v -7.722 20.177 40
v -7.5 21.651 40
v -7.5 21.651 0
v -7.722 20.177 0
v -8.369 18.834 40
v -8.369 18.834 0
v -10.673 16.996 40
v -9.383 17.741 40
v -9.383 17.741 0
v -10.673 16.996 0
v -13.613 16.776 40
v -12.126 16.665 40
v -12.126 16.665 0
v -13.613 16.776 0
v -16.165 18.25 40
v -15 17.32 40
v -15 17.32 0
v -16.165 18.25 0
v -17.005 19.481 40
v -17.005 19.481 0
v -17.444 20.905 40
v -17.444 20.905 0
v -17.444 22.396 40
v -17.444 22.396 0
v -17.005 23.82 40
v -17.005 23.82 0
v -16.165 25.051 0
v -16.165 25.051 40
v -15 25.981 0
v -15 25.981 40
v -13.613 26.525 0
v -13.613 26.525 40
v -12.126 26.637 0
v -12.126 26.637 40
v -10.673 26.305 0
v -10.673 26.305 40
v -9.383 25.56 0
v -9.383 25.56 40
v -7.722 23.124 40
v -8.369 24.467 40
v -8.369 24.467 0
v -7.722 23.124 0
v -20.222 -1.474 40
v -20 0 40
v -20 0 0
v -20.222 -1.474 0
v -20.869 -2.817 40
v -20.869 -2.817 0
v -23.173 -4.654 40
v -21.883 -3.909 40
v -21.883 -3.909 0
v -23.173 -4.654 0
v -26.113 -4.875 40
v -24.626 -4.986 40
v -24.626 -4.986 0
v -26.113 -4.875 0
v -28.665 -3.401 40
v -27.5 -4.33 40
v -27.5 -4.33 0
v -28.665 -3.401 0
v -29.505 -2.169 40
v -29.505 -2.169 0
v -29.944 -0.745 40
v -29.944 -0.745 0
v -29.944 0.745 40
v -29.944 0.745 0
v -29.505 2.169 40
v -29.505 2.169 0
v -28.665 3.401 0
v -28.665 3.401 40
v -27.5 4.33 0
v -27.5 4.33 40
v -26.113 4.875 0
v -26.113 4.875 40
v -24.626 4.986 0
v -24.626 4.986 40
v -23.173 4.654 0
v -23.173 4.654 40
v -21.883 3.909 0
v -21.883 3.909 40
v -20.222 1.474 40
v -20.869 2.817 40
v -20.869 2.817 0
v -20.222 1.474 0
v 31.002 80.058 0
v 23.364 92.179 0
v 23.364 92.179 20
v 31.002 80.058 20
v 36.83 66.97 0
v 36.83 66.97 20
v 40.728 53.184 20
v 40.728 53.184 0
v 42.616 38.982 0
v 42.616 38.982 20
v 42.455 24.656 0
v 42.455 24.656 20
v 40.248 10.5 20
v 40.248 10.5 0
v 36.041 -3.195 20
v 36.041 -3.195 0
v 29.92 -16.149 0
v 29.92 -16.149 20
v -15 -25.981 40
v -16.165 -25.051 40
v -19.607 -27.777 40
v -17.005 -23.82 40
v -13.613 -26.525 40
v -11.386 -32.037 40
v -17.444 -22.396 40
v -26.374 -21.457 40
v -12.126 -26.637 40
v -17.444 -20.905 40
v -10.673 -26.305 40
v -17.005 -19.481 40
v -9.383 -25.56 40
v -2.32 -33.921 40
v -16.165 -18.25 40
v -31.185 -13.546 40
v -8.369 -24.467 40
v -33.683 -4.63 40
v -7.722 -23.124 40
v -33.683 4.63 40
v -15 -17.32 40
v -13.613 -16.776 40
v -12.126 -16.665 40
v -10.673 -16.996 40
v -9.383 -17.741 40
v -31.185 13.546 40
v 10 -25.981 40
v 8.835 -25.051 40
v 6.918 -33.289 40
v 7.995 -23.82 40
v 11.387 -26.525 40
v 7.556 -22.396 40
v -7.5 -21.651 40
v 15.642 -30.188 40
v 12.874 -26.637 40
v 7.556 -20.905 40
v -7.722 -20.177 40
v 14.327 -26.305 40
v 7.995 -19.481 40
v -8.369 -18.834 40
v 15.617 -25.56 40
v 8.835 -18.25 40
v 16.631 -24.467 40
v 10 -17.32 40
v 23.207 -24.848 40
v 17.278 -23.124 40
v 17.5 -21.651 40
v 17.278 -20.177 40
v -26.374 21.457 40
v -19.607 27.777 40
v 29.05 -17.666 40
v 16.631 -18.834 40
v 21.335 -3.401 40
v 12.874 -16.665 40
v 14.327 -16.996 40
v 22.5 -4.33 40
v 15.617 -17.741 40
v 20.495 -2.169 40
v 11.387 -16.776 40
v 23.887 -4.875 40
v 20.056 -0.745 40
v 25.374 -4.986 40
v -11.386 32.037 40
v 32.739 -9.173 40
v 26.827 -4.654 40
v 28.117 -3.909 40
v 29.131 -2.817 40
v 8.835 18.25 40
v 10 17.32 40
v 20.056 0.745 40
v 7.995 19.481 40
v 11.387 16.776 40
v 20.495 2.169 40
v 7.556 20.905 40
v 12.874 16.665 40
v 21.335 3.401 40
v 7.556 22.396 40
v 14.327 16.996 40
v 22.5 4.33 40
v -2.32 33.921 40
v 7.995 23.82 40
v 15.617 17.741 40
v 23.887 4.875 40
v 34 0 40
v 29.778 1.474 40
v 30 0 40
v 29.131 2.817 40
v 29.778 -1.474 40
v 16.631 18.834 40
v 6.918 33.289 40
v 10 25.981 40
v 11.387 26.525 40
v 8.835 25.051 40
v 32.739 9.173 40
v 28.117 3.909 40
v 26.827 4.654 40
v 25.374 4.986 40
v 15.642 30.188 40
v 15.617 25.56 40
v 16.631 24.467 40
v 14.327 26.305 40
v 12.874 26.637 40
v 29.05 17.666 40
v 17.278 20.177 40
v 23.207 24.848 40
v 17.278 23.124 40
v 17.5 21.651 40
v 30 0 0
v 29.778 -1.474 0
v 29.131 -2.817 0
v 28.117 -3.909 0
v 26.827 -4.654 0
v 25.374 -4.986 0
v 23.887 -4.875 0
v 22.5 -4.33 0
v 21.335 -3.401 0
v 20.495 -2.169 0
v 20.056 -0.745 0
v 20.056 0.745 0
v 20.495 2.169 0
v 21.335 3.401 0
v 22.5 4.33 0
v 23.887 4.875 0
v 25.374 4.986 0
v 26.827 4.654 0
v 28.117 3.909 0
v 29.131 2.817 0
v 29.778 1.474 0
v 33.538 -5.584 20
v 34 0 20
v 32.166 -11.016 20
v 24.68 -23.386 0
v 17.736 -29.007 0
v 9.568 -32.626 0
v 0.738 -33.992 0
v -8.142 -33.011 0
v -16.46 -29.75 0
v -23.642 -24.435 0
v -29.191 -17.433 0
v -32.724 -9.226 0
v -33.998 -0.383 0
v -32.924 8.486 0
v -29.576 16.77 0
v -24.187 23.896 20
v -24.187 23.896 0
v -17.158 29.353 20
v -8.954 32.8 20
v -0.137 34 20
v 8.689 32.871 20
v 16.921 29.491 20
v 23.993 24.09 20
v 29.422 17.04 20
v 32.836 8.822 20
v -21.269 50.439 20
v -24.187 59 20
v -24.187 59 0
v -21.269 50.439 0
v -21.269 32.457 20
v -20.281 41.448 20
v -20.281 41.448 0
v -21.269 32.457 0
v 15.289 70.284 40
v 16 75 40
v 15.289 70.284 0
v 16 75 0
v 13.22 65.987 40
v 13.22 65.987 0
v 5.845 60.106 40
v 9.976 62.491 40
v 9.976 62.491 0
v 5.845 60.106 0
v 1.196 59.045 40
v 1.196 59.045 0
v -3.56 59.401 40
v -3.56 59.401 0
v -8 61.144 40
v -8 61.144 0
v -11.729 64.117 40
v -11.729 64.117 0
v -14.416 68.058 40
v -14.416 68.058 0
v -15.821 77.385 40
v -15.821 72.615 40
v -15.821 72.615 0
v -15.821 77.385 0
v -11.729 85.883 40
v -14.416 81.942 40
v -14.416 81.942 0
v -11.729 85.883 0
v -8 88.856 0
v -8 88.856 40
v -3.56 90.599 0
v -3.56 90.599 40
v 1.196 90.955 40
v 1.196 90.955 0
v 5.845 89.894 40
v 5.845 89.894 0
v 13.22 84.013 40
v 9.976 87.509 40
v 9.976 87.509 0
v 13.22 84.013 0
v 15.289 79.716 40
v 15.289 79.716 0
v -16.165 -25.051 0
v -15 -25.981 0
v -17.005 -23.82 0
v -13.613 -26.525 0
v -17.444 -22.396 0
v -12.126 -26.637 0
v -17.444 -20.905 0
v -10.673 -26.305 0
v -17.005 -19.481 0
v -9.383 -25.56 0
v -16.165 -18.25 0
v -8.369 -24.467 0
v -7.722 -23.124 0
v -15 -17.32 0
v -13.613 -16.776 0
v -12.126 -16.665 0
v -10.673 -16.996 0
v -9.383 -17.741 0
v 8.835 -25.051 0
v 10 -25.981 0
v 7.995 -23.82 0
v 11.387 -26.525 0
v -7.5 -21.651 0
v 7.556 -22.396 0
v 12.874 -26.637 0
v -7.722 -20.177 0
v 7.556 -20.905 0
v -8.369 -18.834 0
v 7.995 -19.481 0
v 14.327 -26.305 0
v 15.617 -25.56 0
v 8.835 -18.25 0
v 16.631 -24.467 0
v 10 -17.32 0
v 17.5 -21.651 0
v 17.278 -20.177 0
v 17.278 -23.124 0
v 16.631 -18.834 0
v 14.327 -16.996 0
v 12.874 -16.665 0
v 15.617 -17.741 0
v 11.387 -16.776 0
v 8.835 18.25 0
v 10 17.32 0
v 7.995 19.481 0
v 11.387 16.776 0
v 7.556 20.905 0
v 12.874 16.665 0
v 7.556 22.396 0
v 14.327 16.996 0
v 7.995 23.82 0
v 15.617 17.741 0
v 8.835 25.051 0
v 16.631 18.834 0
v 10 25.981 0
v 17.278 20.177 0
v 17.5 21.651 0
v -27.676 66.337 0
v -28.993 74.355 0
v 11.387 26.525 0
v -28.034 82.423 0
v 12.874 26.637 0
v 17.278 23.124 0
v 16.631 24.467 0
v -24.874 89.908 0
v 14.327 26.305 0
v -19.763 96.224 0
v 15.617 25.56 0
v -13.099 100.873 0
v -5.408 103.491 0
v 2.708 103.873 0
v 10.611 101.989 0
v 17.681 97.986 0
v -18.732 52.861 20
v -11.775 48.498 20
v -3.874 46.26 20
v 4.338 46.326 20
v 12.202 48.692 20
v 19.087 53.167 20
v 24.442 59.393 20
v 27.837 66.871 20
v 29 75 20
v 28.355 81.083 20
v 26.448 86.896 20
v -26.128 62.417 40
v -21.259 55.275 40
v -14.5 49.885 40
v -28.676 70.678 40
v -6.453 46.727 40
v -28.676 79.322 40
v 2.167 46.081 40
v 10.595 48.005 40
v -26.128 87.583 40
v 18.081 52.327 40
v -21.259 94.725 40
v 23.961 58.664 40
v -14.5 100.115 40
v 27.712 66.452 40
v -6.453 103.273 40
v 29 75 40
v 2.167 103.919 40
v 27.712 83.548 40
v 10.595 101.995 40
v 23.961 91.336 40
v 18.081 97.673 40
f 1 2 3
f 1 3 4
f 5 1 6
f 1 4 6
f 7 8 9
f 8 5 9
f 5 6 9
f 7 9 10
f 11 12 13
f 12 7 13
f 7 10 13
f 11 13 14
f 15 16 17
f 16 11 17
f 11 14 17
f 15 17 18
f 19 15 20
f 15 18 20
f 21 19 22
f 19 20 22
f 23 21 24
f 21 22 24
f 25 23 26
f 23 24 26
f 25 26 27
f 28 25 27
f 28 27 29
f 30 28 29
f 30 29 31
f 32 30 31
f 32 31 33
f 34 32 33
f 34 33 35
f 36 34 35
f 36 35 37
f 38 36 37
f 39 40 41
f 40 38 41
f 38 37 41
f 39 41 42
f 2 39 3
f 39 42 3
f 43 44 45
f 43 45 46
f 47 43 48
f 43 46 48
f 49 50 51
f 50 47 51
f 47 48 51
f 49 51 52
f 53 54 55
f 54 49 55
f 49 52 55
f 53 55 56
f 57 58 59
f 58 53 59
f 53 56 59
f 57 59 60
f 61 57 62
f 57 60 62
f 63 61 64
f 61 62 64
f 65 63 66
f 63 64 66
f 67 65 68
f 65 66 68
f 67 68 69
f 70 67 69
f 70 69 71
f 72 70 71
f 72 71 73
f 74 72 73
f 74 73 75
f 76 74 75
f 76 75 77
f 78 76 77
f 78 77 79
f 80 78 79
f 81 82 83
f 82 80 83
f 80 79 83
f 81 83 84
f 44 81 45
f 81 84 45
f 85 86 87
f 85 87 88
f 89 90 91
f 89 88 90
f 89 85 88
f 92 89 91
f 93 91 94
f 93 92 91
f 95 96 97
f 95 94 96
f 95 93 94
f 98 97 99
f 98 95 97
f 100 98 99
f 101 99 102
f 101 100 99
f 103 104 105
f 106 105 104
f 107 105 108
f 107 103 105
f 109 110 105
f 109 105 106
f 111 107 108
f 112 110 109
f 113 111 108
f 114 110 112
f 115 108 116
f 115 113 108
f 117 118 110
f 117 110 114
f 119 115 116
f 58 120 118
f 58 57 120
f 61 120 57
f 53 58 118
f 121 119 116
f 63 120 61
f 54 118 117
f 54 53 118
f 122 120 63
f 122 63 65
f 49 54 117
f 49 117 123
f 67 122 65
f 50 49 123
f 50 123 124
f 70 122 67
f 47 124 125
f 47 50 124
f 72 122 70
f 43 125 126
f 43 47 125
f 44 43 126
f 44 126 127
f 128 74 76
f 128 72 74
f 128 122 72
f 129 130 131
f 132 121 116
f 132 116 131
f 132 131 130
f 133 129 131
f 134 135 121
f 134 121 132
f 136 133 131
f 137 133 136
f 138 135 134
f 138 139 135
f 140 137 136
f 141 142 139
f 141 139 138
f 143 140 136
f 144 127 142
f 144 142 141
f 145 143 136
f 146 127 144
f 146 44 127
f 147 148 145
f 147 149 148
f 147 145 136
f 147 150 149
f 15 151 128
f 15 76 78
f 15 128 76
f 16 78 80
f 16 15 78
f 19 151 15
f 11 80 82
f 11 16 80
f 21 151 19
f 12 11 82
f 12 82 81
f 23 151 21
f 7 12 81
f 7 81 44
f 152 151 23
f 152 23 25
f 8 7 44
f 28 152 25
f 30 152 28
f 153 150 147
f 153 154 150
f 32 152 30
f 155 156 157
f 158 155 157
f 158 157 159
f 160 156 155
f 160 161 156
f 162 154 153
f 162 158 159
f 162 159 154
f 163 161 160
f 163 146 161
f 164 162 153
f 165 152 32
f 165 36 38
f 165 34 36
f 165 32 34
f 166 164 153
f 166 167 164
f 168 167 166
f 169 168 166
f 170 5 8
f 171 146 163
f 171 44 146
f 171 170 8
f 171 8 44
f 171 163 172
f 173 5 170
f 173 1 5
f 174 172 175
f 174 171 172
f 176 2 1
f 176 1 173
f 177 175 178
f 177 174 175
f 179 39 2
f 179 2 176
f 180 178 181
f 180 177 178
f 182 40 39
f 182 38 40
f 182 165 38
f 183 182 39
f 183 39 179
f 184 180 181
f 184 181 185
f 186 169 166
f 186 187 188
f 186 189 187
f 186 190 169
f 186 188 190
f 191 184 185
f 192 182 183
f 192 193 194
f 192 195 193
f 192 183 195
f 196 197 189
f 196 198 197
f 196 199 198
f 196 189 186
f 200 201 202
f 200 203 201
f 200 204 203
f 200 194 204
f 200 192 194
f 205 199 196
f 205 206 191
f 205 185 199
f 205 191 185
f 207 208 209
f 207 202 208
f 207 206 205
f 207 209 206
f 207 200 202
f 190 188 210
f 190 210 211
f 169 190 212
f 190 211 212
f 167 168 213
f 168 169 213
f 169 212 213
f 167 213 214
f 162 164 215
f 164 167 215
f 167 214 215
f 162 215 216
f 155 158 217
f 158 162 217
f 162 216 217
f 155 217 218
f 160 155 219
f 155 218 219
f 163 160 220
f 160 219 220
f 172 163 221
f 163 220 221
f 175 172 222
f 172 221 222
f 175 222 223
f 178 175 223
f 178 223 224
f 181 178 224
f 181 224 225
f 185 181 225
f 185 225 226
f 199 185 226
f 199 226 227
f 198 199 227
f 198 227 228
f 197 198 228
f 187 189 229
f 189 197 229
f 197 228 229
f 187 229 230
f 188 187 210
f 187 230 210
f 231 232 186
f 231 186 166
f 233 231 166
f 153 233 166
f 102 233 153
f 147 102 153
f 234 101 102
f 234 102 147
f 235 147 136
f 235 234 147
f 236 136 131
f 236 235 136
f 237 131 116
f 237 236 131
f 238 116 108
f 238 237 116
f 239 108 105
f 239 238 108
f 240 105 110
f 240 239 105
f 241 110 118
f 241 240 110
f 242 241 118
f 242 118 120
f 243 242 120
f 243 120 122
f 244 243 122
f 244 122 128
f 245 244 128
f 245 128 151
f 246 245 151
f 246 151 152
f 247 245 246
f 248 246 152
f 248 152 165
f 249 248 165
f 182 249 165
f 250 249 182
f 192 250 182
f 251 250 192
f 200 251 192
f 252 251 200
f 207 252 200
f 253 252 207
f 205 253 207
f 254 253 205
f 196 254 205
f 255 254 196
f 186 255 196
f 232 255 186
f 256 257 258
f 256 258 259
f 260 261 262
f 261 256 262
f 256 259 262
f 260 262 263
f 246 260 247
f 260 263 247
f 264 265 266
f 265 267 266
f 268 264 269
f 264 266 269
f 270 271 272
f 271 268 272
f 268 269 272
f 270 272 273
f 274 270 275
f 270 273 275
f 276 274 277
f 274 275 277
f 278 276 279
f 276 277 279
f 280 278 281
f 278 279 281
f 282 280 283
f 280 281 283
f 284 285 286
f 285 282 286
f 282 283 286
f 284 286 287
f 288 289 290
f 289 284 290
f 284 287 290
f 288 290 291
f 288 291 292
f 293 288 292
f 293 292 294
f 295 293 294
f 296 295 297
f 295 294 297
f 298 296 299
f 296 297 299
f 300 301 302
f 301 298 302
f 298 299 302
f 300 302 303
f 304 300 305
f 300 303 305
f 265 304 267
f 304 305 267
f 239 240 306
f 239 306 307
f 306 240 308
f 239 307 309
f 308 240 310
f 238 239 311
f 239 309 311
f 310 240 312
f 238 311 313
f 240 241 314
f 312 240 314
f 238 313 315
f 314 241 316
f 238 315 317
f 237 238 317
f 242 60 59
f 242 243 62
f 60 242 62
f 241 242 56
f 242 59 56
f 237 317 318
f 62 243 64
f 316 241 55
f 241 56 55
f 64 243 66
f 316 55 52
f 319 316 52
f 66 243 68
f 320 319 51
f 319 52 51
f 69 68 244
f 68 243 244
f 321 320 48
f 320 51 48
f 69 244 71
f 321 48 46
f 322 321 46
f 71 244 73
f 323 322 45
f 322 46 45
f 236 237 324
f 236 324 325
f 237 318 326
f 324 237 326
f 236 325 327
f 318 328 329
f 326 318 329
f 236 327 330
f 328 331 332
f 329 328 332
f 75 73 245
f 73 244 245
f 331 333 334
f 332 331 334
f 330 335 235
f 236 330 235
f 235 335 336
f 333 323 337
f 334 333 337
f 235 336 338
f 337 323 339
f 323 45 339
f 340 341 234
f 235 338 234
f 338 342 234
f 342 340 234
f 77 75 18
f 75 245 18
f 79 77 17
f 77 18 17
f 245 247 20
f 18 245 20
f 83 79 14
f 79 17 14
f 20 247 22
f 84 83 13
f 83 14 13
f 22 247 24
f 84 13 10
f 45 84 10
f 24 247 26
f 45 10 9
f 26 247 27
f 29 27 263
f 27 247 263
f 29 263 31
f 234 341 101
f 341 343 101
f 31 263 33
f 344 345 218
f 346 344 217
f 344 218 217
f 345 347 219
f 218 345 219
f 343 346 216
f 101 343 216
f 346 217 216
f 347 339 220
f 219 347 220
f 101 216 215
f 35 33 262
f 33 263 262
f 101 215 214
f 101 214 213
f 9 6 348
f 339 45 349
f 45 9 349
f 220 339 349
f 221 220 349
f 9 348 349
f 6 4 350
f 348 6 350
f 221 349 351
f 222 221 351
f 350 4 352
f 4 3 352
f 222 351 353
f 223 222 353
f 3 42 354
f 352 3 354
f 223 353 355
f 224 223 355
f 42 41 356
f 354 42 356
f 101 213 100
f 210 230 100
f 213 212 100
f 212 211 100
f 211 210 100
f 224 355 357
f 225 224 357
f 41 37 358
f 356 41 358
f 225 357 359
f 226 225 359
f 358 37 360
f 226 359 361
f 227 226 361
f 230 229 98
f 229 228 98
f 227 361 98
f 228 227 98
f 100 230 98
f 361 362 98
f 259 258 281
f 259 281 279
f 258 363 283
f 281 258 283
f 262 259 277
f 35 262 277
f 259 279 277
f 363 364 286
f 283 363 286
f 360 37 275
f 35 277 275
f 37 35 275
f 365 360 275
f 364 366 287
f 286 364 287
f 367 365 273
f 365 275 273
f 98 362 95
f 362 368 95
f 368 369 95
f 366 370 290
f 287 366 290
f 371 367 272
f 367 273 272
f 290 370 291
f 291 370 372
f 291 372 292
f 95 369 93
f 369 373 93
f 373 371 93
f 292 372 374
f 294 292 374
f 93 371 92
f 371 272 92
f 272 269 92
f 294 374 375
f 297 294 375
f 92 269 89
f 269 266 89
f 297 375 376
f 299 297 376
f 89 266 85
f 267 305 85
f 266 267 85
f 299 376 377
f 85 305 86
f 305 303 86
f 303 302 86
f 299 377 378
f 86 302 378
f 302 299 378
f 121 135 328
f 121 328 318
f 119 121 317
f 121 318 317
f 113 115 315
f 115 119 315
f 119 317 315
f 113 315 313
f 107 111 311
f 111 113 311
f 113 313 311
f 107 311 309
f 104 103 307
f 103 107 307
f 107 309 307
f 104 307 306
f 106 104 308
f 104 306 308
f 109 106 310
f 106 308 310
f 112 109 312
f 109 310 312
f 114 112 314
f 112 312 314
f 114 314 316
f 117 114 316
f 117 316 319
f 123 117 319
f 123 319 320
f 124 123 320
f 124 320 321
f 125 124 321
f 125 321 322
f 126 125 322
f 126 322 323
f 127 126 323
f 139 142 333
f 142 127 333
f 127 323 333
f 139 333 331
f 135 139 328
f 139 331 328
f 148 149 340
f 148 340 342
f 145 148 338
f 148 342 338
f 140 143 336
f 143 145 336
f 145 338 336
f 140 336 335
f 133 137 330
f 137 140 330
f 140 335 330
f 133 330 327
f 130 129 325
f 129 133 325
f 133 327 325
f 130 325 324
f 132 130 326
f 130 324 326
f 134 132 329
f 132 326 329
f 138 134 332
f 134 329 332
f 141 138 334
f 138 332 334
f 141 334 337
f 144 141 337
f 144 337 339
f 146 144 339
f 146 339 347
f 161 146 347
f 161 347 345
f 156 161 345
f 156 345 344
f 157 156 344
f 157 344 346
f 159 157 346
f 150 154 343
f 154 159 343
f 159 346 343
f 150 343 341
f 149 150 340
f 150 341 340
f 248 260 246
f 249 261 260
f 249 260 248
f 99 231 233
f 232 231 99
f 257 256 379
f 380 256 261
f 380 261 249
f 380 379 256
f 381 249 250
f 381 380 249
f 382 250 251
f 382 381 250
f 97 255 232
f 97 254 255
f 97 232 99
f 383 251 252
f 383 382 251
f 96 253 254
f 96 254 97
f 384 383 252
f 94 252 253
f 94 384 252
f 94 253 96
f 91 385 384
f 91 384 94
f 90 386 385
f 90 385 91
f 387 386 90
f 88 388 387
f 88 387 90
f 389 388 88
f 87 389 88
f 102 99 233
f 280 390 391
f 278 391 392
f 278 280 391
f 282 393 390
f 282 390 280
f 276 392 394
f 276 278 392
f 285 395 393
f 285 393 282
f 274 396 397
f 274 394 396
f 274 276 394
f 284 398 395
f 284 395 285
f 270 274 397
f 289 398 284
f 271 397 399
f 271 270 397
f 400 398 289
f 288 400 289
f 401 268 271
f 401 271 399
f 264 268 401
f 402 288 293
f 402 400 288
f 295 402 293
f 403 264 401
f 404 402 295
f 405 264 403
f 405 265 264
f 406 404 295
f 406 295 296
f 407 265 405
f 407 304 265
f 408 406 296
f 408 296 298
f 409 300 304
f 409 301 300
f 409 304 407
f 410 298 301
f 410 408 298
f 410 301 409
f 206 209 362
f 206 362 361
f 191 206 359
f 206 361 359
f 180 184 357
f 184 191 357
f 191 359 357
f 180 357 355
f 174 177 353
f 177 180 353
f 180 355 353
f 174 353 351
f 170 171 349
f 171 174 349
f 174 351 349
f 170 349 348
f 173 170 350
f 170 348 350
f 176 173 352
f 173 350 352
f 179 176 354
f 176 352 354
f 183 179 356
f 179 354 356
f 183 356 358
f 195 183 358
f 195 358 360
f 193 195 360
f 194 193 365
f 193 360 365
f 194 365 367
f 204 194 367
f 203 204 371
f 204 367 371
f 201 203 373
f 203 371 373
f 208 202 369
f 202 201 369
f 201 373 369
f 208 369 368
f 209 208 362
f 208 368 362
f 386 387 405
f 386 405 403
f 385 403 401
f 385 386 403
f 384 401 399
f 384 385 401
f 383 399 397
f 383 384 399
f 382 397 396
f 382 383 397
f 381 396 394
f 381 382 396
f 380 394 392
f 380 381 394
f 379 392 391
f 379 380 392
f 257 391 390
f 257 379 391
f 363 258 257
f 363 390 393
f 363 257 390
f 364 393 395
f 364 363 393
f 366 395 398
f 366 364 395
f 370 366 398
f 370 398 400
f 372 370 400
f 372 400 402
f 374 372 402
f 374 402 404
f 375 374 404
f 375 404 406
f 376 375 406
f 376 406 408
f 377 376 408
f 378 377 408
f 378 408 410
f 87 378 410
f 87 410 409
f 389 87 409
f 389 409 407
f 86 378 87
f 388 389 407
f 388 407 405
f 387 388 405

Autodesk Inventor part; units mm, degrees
ref_plane "YZ Plane" through (0, 0, 0) normal (1, 0, 0) x (0, 1, 0)
ref_plane "XZ Plane" through (0, 0, 0) normal (0, 1, 0) x (-1, 0, 0)
ref_plane "XY Plane" through (0, 0, 0) normal (0, 0, 1) x (1, 0, 0)
sketch "Эскиз1" plane through (0, 0, 0) normal (0, 0, 1) x (1, 0, 0)
  circle A0 centre (0, 0) radius 34
  circle A1 centre (0, 75) radius 29
  circle A2 centre (0, 75) radius 16
  arc A3 (29.9201, -16.149) -> (23.364, 92.1791) centre (-57.2016, 32.9408) ccw
  arc A4 (-24.1868, 23.8956) -> (-24.1868, 59) centre (-61.6709, 41.4478) ccw
  circle A5 centre (-25, 0) radius 5
  circle A6 centre (25, 0) radius 5
  circle A7 centre (-12.5, 21.6506) radius 5
  circle A8 centre (12.5, 21.6506) radius 5
  circle A9 centre (-12.5, -21.6506) radius 5
  circle A10 centre (12.5, -21.6506) radius 5
  point P0 (-24.5501, 23.5222)
  dimension "d2" = 58
  dimension "d3" = 32
  dimension "d7" = 100
  dimension "d18" = 41.3901
  dimension "d29" = 10
  dimension "d30" = 10
  dimension "d31" = 10
  dimension "d32" = 10
  dimension "d33" = 10
  dimension "d34" = 10
  dimension "d35" = 68
  dimension "d36" = 25
  dimension "d37" = 95.094
  dimension "d38" = 25
  dimension "d39" = 25
  dimension "d40" = 75
  dimension "d41" = 25
  dimension "d42" = 25
  dimension "d43" = 63.7652
  dimension "d44" = 63.7652
  dimension "d45" = 25
  dimension "d46" = 74.3049
  dimension "d47" = 16.8819
  dimension "d48" = 41.6206
  dimension "d49" = 18.2682
  dimension "d50" = 56.8179
  dimension "d51" = 42.7753
  dimension "d52" = 67.3855
  dimension "d53" = 57.2451
extrude "Выдавливание3" add sketch "Эскиз1" along normal blind 40 contours A0 | A1
extrude "Выдавливание4" cut sketch "Эскиз1" along normal blind 20 contours A0 A4 A1 A3
extrude "Выдавливание5" add sketch "Эскиз1" along normal blind 20 contours A0 A4 A1 A3
equation "\"Радиус_гибки\" = Толщина"
equation "\"Ширина_просечки\" = Толщина"
equation "\"Глубина_просечки\" = 0.5 * Толщина"
equation "\"Размер_просечки\" = 4 * Толщина"
equation "\"Мин_остаток\" = 2 * Толщина"
equation "\"Радиус_перехода\" = Радиус_гибки"
equation "\"Радиус_Якоби\" = Толщина"
equation "\"Размер_зазора\" = Толщина"
equation "\"Толщина\" = 3.048"
properties part number "Кронштейн" material "Полиацеталь, черный"
